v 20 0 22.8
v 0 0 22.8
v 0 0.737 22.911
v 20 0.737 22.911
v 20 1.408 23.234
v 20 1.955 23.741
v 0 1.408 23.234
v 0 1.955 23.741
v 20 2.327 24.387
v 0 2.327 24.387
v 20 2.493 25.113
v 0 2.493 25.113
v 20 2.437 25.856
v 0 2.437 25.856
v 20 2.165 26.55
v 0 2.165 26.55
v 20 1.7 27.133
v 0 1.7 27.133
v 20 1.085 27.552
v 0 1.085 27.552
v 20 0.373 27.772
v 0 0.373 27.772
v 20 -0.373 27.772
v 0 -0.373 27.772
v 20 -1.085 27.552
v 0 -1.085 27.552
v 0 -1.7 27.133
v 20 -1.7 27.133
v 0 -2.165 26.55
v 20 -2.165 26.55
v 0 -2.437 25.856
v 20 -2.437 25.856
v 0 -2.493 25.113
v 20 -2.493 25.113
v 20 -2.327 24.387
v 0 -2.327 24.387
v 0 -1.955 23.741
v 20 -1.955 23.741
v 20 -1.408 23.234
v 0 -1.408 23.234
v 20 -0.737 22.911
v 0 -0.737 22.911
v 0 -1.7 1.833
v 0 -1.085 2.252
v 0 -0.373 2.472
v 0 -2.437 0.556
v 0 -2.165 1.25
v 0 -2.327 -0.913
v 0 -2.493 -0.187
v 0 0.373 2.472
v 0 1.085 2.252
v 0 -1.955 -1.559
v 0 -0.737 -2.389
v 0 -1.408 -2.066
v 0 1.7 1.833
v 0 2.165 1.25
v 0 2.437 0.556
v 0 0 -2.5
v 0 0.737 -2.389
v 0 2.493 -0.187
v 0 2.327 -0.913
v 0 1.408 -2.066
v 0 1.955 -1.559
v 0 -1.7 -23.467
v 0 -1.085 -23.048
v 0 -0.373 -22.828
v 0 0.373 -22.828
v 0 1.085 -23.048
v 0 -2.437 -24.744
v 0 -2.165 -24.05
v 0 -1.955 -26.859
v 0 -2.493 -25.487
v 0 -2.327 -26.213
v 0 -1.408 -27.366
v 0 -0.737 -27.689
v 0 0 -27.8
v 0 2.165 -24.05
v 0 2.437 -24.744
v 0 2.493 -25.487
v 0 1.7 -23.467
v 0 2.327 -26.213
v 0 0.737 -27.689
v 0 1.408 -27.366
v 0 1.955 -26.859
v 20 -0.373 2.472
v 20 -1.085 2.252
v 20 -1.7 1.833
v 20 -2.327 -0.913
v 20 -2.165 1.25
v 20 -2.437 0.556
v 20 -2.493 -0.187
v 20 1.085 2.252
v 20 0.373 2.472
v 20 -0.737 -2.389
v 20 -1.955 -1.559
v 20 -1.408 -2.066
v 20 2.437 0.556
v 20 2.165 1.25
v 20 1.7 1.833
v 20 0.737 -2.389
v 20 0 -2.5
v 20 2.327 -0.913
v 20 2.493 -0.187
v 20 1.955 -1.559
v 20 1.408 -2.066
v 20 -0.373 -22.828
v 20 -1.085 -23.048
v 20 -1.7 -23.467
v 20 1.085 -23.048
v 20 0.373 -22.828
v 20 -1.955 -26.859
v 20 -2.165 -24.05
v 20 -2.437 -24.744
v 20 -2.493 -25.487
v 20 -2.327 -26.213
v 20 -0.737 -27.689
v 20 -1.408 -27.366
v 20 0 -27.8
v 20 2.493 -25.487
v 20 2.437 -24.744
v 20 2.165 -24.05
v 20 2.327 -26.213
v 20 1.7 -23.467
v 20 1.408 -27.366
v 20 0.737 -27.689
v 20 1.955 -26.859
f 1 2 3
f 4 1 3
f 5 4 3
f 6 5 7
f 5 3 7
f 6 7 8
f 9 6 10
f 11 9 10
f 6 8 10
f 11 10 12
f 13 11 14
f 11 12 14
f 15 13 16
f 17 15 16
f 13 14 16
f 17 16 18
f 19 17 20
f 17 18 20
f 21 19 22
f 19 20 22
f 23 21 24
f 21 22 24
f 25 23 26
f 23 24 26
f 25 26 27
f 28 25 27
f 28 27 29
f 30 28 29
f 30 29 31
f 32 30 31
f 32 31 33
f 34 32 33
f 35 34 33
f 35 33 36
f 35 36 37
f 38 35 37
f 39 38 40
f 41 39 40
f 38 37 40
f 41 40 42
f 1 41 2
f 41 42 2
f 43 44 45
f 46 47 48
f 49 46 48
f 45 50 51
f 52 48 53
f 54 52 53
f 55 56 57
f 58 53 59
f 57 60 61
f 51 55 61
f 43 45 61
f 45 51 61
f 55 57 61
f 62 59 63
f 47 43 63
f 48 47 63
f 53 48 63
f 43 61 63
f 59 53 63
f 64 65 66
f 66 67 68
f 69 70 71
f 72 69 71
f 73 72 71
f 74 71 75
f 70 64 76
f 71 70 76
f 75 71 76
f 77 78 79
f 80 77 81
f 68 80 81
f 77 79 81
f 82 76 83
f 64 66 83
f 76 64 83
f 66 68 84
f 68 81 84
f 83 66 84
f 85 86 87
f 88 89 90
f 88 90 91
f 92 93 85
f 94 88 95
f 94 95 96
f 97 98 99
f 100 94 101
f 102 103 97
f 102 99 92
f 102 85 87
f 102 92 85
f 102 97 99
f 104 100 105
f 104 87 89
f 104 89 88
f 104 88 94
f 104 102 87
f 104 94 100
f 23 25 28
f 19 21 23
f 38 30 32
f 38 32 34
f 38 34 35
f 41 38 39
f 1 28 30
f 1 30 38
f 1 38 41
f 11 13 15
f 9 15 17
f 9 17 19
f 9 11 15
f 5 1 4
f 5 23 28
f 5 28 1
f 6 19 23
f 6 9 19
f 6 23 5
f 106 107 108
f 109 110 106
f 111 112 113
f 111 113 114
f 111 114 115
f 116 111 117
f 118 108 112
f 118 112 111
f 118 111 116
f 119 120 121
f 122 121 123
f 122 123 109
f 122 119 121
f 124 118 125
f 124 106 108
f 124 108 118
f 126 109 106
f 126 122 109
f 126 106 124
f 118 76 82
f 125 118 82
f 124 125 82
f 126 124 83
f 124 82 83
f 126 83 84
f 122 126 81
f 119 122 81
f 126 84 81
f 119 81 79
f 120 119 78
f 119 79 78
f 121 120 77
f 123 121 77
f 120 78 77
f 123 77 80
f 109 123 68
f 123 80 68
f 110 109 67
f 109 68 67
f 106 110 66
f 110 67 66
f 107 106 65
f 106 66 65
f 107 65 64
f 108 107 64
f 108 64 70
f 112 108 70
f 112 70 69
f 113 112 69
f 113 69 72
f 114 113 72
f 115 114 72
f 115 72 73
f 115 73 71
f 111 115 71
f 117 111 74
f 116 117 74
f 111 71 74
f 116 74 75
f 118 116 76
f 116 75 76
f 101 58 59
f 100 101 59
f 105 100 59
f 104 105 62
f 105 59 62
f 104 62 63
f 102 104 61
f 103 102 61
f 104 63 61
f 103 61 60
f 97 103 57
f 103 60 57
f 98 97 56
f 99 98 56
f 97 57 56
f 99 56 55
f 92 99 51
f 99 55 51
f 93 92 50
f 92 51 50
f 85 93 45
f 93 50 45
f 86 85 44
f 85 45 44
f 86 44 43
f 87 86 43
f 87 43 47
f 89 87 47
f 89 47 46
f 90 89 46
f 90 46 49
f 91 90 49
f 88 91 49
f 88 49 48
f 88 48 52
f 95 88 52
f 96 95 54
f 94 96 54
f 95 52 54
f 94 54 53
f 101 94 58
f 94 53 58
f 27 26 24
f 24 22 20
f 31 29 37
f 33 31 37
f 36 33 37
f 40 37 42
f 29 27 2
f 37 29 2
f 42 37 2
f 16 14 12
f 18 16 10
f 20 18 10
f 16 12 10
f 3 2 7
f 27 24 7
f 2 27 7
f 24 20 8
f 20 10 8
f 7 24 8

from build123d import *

# Parameters (mm, degrees)
SKETCH1_R             = 2.5
BOSS_EXTRUDE1_DEPTH   = 20
BOSS_EXTRUDE1_2_DEPTH = 20
BOSS_EXTRUDE1_3_DEPTH = 20


with BuildPart() as part:
    # Sketch1 → Boss-Extrude1 (new body)
    with BuildSketch(Plane(origin=(0, 0, 0), x_dir=(0, 0, -1), z_dir=(1, 0, 0))):
        Circle(SKETCH1_R)
    extrude(amount=BOSS_EXTRUDE1_DEPTH)


with BuildPart() as body_2:
    # Sketch1 → Boss-Extrude1 2 (new body)
    with BuildSketch(Plane(origin=(0, 0, 0), x_dir=(0, 0, -1), z_dir=(1, 0, 0))):
        with Locations((-25.3, 0)):
            Circle(SKETCH1_R)
    extrude(amount=BOSS_EXTRUDE1_2_DEPTH)


with BuildPart() as body_3:
    # Sketch1 → Boss-Extrude1 3 (new body)
    with BuildSketch(Plane(origin=(0, 0, 0), x_dir=(0, 0, -1), z_dir=(1, 0, 0))):
        with Locations((25.3, 0)):
            Circle(SKETCH1_R)
    extrude(amount=BOSS_EXTRUDE1_3_DEPTH)


solid = Compound([part.part, body_2.part, body_3.part])
